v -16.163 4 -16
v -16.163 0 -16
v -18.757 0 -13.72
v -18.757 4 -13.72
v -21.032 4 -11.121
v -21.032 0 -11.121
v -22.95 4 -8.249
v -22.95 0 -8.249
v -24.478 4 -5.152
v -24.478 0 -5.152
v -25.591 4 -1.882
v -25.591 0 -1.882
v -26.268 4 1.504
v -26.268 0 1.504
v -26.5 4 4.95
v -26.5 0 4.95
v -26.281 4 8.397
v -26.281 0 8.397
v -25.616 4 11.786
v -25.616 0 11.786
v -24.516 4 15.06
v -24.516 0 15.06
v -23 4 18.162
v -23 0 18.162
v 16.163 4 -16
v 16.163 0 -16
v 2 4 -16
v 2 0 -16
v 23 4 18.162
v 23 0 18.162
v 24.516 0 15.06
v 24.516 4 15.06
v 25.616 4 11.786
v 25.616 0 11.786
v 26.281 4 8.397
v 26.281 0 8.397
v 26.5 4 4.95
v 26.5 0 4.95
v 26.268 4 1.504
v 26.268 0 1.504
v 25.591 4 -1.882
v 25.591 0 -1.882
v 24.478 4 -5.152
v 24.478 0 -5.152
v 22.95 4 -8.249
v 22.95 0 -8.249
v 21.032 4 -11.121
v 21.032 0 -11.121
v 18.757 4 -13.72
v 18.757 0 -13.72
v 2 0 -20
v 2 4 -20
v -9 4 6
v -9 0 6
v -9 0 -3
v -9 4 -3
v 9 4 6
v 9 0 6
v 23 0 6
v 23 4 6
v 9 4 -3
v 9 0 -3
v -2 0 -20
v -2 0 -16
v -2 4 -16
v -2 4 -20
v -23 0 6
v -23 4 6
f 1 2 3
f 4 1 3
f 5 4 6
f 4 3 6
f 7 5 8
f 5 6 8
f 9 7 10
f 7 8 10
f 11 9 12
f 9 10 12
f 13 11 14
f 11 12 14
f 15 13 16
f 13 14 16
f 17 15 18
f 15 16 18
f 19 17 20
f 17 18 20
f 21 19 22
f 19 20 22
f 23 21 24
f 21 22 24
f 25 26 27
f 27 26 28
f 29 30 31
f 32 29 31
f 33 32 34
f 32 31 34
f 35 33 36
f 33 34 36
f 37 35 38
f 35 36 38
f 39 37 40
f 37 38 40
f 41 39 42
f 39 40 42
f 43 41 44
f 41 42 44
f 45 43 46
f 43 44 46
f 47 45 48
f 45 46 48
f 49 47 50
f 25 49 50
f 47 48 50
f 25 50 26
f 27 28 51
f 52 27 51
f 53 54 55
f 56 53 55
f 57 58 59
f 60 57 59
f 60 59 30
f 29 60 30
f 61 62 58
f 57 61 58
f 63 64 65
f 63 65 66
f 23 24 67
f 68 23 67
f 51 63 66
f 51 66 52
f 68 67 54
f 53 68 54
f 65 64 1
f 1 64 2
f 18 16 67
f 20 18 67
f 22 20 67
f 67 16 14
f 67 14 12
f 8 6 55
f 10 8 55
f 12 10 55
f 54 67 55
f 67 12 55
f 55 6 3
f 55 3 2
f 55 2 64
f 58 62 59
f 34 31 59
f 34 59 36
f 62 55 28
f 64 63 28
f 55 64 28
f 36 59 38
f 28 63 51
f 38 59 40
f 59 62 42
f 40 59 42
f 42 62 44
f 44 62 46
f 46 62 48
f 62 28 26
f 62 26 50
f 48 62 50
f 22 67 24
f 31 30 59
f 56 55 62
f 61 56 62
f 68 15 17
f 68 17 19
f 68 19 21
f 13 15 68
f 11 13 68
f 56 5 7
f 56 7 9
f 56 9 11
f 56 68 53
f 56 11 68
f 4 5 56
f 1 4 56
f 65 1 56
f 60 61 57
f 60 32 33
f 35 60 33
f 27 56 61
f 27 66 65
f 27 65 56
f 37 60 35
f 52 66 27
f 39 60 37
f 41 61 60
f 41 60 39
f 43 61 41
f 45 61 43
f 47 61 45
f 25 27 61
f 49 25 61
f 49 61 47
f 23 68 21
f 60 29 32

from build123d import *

# Parameters (mm, degrees)
SCHIZZO1_W                   = 4
SCHIZZO1_H                   = 4
ESTRUSIONE_ESTRUSIONE1_DEPTH = 4


with BuildPart() as part:
    # Schizzo1 → Estrusione-Estrusione1 (new body)
    with BuildSketch(Plane(origin=(0, 0, 0), x_dir=(1, 0, 0), z_dir=(0, 1, 0))):
        with BuildLine():
            Line((-2, 16), (-16.163229875, 16))
            ThreePointArc((-16.163229875, 16), (-25.984761547, 0.200208393), (-23, -18.162446581))
            Line((-23, -18.162446581), (-23, -6))
            Line((-23, -6), (-9, -6))
            Line((-9, -6), (-9, 3))
            Line((-9, 3), (9, 3))
            Line((9, 3), (9, -6))
            Line((9, -6), (23, -6))
            Line((23, -6), (23, -18.162446581))
            ThreePointArc((23, -18.162446581), (25.984761547, 0.200208393), (16.163229875, 16))
            Line((16.163229875, 16), (2, 16))
            Line((2, 16), (-2, 16))
        make_face()
        with Locations((0, 18)):
            Rectangle(SCHIZZO1_W, SCHIZZO1_H)
    extrude(amount=ESTRUSIONE_ESTRUSIONE1_DEPTH)


solid = part.part
